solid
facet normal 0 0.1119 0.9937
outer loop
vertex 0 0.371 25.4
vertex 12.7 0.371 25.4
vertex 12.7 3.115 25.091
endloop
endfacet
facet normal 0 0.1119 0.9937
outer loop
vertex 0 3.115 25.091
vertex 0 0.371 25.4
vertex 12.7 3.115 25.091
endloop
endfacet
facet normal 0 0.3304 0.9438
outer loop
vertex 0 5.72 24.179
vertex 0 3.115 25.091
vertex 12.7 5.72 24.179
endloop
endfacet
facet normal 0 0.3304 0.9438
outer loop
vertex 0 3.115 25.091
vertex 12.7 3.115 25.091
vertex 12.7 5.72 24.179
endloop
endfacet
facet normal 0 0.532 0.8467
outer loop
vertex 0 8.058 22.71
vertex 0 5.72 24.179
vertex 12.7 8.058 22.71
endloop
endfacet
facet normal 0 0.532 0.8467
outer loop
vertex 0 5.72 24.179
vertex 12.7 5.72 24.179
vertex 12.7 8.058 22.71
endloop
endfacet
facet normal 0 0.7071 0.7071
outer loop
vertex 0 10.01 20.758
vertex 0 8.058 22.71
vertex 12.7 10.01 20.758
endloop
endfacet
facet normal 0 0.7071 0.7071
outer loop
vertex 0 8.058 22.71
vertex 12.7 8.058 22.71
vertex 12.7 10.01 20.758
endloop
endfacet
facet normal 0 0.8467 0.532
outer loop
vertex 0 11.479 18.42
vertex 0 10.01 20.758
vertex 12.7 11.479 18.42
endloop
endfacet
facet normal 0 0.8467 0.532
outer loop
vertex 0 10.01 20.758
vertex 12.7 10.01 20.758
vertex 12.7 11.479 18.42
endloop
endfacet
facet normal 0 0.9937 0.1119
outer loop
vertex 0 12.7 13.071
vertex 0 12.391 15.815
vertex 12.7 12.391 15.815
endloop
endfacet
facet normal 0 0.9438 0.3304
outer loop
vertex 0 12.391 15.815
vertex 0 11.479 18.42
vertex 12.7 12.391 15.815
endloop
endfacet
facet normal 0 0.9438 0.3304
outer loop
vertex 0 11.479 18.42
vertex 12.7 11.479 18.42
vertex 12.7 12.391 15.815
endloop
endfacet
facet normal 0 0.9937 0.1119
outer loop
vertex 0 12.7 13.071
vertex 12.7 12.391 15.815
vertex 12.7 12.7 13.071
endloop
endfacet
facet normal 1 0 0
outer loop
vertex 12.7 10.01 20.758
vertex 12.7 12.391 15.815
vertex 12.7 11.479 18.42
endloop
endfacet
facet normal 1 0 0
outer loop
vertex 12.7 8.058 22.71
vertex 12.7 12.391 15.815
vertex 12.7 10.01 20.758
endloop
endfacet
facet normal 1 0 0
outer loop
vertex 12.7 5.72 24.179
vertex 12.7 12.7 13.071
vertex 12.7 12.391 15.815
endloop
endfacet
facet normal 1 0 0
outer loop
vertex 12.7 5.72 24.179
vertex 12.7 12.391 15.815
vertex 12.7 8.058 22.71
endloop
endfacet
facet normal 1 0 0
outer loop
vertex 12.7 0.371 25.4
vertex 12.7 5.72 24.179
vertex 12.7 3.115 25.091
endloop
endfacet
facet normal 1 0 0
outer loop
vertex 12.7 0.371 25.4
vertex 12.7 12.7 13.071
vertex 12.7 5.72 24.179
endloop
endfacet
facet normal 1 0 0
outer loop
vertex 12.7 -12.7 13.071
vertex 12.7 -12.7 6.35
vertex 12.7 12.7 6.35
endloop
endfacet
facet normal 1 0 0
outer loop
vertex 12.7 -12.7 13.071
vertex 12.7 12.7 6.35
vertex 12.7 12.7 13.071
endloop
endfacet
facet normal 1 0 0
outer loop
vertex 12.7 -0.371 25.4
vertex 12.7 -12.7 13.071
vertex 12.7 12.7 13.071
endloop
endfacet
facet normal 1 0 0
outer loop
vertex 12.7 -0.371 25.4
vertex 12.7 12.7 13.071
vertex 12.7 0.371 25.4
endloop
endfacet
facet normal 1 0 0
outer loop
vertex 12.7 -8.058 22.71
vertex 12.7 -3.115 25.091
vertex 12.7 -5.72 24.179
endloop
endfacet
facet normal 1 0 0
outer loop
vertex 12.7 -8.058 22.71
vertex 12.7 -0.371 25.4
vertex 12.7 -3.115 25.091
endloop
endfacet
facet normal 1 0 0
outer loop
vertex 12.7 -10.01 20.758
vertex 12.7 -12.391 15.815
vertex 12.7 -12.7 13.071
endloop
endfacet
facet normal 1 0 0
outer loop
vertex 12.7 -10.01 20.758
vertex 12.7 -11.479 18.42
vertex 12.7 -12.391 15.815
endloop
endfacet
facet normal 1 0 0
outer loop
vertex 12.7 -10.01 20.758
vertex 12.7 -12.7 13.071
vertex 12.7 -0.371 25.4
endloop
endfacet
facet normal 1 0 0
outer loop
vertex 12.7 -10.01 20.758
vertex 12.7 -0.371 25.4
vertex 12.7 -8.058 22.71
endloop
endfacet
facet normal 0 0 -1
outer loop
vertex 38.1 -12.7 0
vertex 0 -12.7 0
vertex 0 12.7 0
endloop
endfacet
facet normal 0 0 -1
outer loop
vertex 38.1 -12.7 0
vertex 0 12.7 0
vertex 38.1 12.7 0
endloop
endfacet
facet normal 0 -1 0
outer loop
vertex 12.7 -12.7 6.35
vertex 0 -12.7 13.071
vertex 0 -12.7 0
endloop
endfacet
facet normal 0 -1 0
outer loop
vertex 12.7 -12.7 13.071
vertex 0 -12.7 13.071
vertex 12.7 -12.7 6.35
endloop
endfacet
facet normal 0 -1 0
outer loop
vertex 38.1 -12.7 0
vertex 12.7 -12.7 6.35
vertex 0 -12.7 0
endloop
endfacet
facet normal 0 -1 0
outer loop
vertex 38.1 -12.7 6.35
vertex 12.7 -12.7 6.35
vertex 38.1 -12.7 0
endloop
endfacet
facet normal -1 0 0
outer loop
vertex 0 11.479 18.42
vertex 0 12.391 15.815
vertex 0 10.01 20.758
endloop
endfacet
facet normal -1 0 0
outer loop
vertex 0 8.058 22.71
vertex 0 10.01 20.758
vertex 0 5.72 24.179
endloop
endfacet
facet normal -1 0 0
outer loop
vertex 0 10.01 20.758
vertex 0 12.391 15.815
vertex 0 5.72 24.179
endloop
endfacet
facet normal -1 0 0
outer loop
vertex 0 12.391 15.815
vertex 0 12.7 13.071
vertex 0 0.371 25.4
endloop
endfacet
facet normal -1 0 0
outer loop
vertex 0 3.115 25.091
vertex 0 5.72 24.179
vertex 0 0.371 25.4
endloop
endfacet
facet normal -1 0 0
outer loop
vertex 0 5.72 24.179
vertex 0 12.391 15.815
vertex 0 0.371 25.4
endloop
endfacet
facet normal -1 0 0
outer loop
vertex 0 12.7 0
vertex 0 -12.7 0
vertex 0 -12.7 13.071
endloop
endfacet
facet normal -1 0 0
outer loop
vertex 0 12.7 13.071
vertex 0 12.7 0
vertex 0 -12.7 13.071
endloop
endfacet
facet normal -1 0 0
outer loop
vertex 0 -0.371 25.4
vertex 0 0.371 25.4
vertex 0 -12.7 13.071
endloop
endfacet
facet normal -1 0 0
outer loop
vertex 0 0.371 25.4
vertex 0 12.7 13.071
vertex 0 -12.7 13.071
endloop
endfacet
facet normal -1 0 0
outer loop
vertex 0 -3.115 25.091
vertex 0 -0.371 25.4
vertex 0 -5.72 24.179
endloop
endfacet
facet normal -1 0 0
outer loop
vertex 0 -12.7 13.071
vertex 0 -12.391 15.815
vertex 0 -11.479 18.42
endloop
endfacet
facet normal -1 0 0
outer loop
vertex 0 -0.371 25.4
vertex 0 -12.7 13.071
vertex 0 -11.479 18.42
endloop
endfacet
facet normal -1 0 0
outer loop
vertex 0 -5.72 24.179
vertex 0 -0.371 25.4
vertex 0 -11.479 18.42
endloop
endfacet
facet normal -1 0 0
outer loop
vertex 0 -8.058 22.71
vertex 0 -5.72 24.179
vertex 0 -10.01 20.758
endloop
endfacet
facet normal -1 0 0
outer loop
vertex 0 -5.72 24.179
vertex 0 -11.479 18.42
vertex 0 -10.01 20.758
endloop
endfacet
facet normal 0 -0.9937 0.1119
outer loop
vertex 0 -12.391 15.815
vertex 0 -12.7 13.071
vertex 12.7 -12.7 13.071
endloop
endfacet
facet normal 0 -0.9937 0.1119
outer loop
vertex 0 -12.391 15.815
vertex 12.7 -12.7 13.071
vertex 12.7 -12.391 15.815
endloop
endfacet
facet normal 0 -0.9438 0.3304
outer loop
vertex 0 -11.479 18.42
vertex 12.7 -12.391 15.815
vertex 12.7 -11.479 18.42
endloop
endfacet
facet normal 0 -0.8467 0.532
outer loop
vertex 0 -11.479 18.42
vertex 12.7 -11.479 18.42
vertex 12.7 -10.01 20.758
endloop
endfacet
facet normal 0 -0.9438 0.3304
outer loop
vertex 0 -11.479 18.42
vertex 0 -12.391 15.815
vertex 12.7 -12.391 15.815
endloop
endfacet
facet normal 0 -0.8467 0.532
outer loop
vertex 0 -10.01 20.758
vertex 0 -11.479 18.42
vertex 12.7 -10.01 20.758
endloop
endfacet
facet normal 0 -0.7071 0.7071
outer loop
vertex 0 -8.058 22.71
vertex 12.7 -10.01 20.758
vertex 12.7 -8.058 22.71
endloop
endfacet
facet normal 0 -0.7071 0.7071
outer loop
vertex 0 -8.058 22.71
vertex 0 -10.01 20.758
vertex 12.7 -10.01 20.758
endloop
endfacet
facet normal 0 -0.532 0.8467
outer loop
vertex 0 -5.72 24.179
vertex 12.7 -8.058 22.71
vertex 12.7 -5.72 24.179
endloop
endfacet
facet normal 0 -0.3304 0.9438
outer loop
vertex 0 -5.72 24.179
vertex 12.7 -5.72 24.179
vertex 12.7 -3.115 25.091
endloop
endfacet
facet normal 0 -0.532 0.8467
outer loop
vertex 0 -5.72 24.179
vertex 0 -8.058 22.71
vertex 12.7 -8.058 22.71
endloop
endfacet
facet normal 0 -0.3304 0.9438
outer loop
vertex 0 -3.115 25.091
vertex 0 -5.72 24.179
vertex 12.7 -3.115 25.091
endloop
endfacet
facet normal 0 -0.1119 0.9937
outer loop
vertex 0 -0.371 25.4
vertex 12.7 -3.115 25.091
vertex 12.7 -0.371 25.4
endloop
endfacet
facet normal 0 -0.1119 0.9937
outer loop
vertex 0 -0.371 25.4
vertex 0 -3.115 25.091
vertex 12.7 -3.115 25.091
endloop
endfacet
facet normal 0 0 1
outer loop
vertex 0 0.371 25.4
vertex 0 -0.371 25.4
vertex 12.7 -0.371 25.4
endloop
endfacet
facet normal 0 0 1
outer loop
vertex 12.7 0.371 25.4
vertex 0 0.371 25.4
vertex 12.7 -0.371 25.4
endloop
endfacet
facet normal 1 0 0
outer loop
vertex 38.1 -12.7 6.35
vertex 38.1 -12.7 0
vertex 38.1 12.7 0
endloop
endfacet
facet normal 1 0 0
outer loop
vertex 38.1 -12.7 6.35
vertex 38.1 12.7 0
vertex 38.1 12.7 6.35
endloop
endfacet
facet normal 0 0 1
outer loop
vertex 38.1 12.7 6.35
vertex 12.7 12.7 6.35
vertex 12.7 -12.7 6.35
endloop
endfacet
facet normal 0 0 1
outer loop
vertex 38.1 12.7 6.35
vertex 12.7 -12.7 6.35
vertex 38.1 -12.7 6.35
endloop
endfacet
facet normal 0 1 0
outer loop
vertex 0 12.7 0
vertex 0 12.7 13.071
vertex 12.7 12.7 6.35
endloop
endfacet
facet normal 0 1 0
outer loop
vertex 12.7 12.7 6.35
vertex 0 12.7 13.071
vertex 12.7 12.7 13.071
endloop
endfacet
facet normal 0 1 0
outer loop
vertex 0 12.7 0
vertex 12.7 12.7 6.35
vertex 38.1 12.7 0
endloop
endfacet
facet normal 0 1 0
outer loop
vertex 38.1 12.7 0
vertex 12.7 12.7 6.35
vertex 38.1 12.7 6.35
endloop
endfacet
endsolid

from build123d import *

# Parameters (mm, degrees)
F0_W     = 38.1
F0_H     = 25.4
F1_DEPTH = 12.7
F2_W     = 25.4
F2_H     = 19.05
F3_DEPTH = 12.7
F5_DEPTH = 12.7


with BuildPart() as f1:
    # F0 (on Front) → F1 (new body, symmetric)
    with BuildSketch(Plane.XZ):
        with Locations((19.05, 12.7)):
            Rectangle(F0_W, F0_H)
    extrude(amount=F1_DEPTH, both=True)

    # F2 (on Front) → F3 (cut, symmetric)
    with BuildSketch(Plane.XZ):
        with Locations((25.4, 15.875)):
            Rectangle(F2_W, F2_H)
    extrude(amount=F3_DEPTH, both=True, mode=Mode.SUBTRACT)

    # F4 (on Right) → F5 (cut, symmetric)
    with BuildSketch(Plane.YZ):
        with BuildLine():
            ThreePointArc((-12.7, 13.071217), (-9.088983, 21.788983), (-0.371217, 25.4))
            Line((-0.371217, 25.4), (-12.7, 25.4))
            Line((-12.7, 25.4), (-12.7, 13.071217))
        make_face()
        with BuildLine():
            Line((12.7, 25.4), (0.371217, 25.4))
            ThreePointArc((0.371217, 25.4), (9.088983, 21.788983), (12.7, 13.071217))
            Line((12.7, 13.071217), (12.7, 25.4))
        make_face()
    extrude(amount=F5_DEPTH, both=True, mode=Mode.SUBTRACT)


solid = f1.part
